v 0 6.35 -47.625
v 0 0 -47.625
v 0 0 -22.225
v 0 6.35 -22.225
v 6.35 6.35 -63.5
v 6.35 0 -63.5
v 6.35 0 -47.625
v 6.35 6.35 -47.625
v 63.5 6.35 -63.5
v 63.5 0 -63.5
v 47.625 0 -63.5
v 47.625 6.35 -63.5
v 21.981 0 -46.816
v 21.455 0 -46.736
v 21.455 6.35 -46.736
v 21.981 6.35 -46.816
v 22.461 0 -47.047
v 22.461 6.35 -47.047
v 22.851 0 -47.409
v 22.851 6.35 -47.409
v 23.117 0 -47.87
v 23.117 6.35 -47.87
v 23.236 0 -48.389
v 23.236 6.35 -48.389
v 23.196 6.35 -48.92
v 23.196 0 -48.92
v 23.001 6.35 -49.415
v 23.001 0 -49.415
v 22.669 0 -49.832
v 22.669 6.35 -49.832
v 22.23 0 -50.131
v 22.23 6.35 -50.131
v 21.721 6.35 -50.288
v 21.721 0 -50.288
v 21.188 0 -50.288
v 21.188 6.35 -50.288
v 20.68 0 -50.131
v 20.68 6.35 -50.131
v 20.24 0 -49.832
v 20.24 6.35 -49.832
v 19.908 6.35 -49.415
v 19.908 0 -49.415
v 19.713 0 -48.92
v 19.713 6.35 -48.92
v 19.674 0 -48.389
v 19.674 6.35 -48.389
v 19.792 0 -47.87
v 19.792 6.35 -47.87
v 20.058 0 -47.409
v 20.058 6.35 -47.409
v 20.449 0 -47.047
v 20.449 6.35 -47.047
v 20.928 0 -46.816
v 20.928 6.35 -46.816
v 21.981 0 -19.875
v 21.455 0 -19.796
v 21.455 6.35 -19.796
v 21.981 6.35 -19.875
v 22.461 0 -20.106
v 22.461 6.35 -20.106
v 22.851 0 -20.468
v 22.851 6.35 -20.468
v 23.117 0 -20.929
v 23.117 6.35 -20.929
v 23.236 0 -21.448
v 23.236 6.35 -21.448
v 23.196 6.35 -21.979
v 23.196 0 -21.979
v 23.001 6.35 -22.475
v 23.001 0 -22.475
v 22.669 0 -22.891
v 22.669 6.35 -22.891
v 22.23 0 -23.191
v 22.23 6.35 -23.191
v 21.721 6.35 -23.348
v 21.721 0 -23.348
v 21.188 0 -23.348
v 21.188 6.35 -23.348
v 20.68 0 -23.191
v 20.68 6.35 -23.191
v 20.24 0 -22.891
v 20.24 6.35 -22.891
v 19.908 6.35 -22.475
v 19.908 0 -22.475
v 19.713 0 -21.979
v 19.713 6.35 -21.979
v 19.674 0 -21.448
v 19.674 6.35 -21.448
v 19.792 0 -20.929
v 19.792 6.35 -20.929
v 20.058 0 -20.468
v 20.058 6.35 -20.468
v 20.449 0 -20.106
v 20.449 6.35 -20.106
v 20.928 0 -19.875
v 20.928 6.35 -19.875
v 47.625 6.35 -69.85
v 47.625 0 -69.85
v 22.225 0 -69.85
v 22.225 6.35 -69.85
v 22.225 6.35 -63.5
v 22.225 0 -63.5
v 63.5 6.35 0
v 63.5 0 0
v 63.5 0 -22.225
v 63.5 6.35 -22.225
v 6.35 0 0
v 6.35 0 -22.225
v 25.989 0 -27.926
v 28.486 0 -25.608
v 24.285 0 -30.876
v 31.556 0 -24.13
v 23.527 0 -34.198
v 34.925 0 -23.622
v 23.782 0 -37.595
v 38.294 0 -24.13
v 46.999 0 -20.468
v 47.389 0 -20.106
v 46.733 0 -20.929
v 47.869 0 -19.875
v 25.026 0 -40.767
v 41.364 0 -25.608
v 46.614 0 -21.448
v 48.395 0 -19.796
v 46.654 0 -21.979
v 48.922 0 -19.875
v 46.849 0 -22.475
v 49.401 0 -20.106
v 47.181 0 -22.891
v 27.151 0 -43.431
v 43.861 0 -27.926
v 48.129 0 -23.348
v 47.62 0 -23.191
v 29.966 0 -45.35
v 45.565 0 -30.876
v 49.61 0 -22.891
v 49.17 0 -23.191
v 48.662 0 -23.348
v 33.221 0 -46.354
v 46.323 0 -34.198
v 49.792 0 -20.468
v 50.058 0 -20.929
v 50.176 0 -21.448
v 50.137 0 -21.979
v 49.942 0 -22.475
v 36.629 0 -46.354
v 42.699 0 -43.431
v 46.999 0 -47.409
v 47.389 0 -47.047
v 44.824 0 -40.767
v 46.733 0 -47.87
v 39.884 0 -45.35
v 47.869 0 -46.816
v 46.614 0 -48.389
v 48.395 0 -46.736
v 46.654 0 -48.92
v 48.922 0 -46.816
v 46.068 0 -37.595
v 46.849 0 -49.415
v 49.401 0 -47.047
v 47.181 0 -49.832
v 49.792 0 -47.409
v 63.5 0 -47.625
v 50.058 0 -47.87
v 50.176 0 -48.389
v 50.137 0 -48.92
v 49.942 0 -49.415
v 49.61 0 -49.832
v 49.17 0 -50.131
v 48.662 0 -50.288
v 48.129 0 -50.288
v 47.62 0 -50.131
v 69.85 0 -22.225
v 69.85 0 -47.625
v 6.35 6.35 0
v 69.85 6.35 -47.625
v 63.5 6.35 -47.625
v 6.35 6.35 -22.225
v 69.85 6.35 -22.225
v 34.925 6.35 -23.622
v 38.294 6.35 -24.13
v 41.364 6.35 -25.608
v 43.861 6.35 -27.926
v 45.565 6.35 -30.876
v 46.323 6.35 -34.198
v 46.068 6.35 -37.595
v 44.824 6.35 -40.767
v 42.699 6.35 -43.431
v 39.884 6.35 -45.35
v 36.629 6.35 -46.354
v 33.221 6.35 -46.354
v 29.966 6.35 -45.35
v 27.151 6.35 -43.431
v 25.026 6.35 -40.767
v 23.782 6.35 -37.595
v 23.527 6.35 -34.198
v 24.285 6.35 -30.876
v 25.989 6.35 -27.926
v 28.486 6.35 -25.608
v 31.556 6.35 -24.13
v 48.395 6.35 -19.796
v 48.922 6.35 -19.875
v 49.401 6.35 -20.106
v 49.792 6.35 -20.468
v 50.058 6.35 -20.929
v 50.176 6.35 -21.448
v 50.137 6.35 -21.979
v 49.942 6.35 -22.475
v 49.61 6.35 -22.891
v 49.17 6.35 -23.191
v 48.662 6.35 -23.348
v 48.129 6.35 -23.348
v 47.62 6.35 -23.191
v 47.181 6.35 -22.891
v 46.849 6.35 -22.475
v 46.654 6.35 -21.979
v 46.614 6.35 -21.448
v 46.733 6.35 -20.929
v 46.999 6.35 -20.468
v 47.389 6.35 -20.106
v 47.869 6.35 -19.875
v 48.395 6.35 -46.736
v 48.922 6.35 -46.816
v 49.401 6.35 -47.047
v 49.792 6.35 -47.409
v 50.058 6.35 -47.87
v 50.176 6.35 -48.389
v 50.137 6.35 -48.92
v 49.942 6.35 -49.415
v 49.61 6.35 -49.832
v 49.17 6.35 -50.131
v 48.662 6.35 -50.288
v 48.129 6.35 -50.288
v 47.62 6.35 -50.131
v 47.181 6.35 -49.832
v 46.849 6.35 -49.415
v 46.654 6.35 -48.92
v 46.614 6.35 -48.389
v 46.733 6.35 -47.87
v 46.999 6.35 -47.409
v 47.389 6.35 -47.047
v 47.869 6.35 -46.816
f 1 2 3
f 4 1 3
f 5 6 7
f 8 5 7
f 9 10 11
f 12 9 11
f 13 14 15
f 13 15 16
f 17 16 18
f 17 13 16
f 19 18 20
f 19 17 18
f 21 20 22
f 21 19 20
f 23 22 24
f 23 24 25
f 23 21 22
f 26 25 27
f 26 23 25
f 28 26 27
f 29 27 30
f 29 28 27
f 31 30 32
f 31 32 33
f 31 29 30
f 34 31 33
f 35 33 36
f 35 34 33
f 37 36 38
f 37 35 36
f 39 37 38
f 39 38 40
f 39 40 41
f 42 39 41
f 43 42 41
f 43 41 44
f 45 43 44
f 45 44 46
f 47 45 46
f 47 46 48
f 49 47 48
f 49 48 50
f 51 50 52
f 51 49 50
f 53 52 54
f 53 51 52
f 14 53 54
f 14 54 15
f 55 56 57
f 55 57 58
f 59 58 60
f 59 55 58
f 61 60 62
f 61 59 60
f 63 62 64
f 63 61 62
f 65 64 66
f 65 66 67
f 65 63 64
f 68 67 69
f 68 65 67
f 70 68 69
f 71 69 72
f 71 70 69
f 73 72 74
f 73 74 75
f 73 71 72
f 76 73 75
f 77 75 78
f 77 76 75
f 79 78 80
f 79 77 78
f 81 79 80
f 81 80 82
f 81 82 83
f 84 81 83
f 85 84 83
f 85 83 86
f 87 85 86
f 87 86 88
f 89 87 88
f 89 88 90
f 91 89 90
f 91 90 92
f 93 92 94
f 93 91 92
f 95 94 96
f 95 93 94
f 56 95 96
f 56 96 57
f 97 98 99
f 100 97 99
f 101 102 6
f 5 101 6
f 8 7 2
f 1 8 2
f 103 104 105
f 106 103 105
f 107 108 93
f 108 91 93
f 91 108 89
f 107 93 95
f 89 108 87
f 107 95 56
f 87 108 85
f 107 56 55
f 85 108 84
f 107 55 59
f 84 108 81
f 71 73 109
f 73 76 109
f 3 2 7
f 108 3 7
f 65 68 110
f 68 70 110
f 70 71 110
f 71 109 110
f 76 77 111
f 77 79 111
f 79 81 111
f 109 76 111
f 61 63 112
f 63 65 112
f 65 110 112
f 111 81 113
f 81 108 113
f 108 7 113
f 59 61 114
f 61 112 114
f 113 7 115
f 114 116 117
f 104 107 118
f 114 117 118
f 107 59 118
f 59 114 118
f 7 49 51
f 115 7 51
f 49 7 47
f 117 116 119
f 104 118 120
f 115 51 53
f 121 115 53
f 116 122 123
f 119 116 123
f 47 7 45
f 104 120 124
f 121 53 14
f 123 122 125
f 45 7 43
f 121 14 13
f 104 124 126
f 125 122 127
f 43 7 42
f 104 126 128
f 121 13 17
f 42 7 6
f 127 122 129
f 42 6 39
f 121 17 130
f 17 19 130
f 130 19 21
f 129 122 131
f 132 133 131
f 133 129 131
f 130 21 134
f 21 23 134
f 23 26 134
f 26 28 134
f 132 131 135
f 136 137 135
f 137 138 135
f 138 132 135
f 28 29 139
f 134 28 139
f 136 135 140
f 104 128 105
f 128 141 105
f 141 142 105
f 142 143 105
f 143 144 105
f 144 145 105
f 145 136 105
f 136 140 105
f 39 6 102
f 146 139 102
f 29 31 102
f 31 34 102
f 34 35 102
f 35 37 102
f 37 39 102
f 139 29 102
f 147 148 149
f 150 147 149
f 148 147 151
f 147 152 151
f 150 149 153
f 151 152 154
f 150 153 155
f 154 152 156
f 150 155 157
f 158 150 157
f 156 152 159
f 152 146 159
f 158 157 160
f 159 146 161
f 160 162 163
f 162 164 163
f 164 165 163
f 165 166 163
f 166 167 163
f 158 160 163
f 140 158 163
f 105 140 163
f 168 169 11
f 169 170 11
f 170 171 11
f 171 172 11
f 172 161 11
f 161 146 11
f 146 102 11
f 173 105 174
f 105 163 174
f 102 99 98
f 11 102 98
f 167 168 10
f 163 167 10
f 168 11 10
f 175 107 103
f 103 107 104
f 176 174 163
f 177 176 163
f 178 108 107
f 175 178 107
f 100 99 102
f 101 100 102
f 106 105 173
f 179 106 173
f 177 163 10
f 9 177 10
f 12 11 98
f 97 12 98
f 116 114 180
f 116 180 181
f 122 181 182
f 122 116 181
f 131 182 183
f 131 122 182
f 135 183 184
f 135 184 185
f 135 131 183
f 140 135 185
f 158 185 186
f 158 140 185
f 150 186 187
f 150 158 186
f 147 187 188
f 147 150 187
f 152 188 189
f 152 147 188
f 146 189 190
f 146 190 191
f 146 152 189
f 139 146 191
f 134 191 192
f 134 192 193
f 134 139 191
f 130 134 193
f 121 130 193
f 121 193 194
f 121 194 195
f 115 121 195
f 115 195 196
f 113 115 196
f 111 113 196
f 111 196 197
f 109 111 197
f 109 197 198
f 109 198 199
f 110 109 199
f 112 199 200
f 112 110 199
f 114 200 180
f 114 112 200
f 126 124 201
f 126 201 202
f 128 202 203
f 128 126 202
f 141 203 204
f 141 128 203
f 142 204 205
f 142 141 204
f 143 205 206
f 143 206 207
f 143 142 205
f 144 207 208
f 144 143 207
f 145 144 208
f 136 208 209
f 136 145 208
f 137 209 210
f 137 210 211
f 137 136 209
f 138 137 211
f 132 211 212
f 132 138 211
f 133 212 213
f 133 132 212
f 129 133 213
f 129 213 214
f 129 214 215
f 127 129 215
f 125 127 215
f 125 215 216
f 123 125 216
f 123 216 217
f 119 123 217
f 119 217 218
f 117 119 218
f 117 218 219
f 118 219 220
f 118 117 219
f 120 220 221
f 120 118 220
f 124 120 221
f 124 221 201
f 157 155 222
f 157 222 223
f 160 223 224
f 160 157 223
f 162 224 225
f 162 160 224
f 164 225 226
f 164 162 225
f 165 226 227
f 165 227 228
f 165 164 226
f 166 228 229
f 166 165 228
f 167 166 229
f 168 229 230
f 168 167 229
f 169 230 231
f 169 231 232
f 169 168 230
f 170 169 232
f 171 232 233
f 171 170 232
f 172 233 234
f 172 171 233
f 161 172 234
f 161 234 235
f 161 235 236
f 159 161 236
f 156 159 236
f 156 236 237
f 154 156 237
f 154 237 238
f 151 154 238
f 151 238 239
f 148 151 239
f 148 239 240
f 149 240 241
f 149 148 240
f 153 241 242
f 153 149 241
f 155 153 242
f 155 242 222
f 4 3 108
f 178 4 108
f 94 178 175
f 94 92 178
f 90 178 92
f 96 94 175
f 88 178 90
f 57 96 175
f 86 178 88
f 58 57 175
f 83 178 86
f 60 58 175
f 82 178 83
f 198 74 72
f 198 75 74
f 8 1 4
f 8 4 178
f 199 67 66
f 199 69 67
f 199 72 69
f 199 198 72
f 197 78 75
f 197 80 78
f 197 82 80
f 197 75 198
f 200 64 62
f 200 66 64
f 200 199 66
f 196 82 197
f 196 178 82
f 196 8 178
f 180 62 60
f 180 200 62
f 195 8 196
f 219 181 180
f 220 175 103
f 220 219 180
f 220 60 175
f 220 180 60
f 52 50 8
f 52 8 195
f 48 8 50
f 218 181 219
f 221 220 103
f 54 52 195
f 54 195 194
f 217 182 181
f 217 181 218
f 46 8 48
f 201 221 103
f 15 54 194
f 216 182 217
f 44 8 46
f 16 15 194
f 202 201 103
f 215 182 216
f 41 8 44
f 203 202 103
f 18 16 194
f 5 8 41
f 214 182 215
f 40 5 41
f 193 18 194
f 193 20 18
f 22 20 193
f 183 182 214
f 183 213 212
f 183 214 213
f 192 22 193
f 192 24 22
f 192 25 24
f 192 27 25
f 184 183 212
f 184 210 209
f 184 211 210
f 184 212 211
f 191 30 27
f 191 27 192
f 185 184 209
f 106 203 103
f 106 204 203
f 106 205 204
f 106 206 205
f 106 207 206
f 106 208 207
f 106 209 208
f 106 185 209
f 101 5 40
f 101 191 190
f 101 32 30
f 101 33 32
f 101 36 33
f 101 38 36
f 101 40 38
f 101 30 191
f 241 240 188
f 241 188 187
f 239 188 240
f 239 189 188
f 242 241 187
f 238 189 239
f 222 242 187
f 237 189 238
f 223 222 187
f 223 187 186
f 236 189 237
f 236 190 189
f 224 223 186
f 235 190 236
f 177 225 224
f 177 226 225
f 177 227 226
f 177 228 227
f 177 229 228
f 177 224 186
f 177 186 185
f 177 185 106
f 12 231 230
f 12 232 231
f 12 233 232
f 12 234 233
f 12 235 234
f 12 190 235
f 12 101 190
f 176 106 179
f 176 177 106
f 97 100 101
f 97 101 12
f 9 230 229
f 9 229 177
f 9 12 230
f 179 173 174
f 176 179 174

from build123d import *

# Parameters (mm, degrees)
SKETCH1_R      = 11.43
SKETCH1_R_2    = 1.7859375
EXTRUDE1_DEPTH = 6.35


with BuildPart() as part:
    # Sketch1 → Extrude1 (new body)
    with BuildSketch(Plane(origin=(0, 0, 0), x_dir=(1, 0, 0), z_dir=(0, 1, 0))):
        Polygon((6.35, 47.625), (0, 47.625), (0, 22.225), (6.35, 22.225), (6.35, 0), (63.5, 0), (63.5, 22.225), (69.85, 22.225), (69.85, 47.625), (63.5, 47.625), (63.5, 63.5), (47.625, 63.5), (47.625, 69.85), (22.225, 69.85), (22.225, 63.5), (6.35, 63.5), align=None)
        with Locations(Location((34.925, 35.052, 0), (0, 0, 270))):
            Circle(SKETCH1_R, mode=Mode.SUBTRACT)
        with Locations(Location((21.454615818, 48.522384182, 0), (0, 0, 270))):
            Circle(SKETCH1_R_2, mode=Mode.SUBTRACT)
        with Locations(Location((48.395384182, 48.522384182, 0), (0, 0, 270))):
            Circle(SKETCH1_R_2, mode=Mode.SUBTRACT)
        with Locations(Location((48.395384182, 21.581615818, 0), (0, 0, 270))):
            Circle(SKETCH1_R_2, mode=Mode.SUBTRACT)
        with Locations(Location((21.454615818, 21.581615818, 0), (0, 0, 270))):
            Circle(SKETCH1_R_2, mode=Mode.SUBTRACT)
    extrude(amount=EXTRUDE1_DEPTH)


solid = part.part
